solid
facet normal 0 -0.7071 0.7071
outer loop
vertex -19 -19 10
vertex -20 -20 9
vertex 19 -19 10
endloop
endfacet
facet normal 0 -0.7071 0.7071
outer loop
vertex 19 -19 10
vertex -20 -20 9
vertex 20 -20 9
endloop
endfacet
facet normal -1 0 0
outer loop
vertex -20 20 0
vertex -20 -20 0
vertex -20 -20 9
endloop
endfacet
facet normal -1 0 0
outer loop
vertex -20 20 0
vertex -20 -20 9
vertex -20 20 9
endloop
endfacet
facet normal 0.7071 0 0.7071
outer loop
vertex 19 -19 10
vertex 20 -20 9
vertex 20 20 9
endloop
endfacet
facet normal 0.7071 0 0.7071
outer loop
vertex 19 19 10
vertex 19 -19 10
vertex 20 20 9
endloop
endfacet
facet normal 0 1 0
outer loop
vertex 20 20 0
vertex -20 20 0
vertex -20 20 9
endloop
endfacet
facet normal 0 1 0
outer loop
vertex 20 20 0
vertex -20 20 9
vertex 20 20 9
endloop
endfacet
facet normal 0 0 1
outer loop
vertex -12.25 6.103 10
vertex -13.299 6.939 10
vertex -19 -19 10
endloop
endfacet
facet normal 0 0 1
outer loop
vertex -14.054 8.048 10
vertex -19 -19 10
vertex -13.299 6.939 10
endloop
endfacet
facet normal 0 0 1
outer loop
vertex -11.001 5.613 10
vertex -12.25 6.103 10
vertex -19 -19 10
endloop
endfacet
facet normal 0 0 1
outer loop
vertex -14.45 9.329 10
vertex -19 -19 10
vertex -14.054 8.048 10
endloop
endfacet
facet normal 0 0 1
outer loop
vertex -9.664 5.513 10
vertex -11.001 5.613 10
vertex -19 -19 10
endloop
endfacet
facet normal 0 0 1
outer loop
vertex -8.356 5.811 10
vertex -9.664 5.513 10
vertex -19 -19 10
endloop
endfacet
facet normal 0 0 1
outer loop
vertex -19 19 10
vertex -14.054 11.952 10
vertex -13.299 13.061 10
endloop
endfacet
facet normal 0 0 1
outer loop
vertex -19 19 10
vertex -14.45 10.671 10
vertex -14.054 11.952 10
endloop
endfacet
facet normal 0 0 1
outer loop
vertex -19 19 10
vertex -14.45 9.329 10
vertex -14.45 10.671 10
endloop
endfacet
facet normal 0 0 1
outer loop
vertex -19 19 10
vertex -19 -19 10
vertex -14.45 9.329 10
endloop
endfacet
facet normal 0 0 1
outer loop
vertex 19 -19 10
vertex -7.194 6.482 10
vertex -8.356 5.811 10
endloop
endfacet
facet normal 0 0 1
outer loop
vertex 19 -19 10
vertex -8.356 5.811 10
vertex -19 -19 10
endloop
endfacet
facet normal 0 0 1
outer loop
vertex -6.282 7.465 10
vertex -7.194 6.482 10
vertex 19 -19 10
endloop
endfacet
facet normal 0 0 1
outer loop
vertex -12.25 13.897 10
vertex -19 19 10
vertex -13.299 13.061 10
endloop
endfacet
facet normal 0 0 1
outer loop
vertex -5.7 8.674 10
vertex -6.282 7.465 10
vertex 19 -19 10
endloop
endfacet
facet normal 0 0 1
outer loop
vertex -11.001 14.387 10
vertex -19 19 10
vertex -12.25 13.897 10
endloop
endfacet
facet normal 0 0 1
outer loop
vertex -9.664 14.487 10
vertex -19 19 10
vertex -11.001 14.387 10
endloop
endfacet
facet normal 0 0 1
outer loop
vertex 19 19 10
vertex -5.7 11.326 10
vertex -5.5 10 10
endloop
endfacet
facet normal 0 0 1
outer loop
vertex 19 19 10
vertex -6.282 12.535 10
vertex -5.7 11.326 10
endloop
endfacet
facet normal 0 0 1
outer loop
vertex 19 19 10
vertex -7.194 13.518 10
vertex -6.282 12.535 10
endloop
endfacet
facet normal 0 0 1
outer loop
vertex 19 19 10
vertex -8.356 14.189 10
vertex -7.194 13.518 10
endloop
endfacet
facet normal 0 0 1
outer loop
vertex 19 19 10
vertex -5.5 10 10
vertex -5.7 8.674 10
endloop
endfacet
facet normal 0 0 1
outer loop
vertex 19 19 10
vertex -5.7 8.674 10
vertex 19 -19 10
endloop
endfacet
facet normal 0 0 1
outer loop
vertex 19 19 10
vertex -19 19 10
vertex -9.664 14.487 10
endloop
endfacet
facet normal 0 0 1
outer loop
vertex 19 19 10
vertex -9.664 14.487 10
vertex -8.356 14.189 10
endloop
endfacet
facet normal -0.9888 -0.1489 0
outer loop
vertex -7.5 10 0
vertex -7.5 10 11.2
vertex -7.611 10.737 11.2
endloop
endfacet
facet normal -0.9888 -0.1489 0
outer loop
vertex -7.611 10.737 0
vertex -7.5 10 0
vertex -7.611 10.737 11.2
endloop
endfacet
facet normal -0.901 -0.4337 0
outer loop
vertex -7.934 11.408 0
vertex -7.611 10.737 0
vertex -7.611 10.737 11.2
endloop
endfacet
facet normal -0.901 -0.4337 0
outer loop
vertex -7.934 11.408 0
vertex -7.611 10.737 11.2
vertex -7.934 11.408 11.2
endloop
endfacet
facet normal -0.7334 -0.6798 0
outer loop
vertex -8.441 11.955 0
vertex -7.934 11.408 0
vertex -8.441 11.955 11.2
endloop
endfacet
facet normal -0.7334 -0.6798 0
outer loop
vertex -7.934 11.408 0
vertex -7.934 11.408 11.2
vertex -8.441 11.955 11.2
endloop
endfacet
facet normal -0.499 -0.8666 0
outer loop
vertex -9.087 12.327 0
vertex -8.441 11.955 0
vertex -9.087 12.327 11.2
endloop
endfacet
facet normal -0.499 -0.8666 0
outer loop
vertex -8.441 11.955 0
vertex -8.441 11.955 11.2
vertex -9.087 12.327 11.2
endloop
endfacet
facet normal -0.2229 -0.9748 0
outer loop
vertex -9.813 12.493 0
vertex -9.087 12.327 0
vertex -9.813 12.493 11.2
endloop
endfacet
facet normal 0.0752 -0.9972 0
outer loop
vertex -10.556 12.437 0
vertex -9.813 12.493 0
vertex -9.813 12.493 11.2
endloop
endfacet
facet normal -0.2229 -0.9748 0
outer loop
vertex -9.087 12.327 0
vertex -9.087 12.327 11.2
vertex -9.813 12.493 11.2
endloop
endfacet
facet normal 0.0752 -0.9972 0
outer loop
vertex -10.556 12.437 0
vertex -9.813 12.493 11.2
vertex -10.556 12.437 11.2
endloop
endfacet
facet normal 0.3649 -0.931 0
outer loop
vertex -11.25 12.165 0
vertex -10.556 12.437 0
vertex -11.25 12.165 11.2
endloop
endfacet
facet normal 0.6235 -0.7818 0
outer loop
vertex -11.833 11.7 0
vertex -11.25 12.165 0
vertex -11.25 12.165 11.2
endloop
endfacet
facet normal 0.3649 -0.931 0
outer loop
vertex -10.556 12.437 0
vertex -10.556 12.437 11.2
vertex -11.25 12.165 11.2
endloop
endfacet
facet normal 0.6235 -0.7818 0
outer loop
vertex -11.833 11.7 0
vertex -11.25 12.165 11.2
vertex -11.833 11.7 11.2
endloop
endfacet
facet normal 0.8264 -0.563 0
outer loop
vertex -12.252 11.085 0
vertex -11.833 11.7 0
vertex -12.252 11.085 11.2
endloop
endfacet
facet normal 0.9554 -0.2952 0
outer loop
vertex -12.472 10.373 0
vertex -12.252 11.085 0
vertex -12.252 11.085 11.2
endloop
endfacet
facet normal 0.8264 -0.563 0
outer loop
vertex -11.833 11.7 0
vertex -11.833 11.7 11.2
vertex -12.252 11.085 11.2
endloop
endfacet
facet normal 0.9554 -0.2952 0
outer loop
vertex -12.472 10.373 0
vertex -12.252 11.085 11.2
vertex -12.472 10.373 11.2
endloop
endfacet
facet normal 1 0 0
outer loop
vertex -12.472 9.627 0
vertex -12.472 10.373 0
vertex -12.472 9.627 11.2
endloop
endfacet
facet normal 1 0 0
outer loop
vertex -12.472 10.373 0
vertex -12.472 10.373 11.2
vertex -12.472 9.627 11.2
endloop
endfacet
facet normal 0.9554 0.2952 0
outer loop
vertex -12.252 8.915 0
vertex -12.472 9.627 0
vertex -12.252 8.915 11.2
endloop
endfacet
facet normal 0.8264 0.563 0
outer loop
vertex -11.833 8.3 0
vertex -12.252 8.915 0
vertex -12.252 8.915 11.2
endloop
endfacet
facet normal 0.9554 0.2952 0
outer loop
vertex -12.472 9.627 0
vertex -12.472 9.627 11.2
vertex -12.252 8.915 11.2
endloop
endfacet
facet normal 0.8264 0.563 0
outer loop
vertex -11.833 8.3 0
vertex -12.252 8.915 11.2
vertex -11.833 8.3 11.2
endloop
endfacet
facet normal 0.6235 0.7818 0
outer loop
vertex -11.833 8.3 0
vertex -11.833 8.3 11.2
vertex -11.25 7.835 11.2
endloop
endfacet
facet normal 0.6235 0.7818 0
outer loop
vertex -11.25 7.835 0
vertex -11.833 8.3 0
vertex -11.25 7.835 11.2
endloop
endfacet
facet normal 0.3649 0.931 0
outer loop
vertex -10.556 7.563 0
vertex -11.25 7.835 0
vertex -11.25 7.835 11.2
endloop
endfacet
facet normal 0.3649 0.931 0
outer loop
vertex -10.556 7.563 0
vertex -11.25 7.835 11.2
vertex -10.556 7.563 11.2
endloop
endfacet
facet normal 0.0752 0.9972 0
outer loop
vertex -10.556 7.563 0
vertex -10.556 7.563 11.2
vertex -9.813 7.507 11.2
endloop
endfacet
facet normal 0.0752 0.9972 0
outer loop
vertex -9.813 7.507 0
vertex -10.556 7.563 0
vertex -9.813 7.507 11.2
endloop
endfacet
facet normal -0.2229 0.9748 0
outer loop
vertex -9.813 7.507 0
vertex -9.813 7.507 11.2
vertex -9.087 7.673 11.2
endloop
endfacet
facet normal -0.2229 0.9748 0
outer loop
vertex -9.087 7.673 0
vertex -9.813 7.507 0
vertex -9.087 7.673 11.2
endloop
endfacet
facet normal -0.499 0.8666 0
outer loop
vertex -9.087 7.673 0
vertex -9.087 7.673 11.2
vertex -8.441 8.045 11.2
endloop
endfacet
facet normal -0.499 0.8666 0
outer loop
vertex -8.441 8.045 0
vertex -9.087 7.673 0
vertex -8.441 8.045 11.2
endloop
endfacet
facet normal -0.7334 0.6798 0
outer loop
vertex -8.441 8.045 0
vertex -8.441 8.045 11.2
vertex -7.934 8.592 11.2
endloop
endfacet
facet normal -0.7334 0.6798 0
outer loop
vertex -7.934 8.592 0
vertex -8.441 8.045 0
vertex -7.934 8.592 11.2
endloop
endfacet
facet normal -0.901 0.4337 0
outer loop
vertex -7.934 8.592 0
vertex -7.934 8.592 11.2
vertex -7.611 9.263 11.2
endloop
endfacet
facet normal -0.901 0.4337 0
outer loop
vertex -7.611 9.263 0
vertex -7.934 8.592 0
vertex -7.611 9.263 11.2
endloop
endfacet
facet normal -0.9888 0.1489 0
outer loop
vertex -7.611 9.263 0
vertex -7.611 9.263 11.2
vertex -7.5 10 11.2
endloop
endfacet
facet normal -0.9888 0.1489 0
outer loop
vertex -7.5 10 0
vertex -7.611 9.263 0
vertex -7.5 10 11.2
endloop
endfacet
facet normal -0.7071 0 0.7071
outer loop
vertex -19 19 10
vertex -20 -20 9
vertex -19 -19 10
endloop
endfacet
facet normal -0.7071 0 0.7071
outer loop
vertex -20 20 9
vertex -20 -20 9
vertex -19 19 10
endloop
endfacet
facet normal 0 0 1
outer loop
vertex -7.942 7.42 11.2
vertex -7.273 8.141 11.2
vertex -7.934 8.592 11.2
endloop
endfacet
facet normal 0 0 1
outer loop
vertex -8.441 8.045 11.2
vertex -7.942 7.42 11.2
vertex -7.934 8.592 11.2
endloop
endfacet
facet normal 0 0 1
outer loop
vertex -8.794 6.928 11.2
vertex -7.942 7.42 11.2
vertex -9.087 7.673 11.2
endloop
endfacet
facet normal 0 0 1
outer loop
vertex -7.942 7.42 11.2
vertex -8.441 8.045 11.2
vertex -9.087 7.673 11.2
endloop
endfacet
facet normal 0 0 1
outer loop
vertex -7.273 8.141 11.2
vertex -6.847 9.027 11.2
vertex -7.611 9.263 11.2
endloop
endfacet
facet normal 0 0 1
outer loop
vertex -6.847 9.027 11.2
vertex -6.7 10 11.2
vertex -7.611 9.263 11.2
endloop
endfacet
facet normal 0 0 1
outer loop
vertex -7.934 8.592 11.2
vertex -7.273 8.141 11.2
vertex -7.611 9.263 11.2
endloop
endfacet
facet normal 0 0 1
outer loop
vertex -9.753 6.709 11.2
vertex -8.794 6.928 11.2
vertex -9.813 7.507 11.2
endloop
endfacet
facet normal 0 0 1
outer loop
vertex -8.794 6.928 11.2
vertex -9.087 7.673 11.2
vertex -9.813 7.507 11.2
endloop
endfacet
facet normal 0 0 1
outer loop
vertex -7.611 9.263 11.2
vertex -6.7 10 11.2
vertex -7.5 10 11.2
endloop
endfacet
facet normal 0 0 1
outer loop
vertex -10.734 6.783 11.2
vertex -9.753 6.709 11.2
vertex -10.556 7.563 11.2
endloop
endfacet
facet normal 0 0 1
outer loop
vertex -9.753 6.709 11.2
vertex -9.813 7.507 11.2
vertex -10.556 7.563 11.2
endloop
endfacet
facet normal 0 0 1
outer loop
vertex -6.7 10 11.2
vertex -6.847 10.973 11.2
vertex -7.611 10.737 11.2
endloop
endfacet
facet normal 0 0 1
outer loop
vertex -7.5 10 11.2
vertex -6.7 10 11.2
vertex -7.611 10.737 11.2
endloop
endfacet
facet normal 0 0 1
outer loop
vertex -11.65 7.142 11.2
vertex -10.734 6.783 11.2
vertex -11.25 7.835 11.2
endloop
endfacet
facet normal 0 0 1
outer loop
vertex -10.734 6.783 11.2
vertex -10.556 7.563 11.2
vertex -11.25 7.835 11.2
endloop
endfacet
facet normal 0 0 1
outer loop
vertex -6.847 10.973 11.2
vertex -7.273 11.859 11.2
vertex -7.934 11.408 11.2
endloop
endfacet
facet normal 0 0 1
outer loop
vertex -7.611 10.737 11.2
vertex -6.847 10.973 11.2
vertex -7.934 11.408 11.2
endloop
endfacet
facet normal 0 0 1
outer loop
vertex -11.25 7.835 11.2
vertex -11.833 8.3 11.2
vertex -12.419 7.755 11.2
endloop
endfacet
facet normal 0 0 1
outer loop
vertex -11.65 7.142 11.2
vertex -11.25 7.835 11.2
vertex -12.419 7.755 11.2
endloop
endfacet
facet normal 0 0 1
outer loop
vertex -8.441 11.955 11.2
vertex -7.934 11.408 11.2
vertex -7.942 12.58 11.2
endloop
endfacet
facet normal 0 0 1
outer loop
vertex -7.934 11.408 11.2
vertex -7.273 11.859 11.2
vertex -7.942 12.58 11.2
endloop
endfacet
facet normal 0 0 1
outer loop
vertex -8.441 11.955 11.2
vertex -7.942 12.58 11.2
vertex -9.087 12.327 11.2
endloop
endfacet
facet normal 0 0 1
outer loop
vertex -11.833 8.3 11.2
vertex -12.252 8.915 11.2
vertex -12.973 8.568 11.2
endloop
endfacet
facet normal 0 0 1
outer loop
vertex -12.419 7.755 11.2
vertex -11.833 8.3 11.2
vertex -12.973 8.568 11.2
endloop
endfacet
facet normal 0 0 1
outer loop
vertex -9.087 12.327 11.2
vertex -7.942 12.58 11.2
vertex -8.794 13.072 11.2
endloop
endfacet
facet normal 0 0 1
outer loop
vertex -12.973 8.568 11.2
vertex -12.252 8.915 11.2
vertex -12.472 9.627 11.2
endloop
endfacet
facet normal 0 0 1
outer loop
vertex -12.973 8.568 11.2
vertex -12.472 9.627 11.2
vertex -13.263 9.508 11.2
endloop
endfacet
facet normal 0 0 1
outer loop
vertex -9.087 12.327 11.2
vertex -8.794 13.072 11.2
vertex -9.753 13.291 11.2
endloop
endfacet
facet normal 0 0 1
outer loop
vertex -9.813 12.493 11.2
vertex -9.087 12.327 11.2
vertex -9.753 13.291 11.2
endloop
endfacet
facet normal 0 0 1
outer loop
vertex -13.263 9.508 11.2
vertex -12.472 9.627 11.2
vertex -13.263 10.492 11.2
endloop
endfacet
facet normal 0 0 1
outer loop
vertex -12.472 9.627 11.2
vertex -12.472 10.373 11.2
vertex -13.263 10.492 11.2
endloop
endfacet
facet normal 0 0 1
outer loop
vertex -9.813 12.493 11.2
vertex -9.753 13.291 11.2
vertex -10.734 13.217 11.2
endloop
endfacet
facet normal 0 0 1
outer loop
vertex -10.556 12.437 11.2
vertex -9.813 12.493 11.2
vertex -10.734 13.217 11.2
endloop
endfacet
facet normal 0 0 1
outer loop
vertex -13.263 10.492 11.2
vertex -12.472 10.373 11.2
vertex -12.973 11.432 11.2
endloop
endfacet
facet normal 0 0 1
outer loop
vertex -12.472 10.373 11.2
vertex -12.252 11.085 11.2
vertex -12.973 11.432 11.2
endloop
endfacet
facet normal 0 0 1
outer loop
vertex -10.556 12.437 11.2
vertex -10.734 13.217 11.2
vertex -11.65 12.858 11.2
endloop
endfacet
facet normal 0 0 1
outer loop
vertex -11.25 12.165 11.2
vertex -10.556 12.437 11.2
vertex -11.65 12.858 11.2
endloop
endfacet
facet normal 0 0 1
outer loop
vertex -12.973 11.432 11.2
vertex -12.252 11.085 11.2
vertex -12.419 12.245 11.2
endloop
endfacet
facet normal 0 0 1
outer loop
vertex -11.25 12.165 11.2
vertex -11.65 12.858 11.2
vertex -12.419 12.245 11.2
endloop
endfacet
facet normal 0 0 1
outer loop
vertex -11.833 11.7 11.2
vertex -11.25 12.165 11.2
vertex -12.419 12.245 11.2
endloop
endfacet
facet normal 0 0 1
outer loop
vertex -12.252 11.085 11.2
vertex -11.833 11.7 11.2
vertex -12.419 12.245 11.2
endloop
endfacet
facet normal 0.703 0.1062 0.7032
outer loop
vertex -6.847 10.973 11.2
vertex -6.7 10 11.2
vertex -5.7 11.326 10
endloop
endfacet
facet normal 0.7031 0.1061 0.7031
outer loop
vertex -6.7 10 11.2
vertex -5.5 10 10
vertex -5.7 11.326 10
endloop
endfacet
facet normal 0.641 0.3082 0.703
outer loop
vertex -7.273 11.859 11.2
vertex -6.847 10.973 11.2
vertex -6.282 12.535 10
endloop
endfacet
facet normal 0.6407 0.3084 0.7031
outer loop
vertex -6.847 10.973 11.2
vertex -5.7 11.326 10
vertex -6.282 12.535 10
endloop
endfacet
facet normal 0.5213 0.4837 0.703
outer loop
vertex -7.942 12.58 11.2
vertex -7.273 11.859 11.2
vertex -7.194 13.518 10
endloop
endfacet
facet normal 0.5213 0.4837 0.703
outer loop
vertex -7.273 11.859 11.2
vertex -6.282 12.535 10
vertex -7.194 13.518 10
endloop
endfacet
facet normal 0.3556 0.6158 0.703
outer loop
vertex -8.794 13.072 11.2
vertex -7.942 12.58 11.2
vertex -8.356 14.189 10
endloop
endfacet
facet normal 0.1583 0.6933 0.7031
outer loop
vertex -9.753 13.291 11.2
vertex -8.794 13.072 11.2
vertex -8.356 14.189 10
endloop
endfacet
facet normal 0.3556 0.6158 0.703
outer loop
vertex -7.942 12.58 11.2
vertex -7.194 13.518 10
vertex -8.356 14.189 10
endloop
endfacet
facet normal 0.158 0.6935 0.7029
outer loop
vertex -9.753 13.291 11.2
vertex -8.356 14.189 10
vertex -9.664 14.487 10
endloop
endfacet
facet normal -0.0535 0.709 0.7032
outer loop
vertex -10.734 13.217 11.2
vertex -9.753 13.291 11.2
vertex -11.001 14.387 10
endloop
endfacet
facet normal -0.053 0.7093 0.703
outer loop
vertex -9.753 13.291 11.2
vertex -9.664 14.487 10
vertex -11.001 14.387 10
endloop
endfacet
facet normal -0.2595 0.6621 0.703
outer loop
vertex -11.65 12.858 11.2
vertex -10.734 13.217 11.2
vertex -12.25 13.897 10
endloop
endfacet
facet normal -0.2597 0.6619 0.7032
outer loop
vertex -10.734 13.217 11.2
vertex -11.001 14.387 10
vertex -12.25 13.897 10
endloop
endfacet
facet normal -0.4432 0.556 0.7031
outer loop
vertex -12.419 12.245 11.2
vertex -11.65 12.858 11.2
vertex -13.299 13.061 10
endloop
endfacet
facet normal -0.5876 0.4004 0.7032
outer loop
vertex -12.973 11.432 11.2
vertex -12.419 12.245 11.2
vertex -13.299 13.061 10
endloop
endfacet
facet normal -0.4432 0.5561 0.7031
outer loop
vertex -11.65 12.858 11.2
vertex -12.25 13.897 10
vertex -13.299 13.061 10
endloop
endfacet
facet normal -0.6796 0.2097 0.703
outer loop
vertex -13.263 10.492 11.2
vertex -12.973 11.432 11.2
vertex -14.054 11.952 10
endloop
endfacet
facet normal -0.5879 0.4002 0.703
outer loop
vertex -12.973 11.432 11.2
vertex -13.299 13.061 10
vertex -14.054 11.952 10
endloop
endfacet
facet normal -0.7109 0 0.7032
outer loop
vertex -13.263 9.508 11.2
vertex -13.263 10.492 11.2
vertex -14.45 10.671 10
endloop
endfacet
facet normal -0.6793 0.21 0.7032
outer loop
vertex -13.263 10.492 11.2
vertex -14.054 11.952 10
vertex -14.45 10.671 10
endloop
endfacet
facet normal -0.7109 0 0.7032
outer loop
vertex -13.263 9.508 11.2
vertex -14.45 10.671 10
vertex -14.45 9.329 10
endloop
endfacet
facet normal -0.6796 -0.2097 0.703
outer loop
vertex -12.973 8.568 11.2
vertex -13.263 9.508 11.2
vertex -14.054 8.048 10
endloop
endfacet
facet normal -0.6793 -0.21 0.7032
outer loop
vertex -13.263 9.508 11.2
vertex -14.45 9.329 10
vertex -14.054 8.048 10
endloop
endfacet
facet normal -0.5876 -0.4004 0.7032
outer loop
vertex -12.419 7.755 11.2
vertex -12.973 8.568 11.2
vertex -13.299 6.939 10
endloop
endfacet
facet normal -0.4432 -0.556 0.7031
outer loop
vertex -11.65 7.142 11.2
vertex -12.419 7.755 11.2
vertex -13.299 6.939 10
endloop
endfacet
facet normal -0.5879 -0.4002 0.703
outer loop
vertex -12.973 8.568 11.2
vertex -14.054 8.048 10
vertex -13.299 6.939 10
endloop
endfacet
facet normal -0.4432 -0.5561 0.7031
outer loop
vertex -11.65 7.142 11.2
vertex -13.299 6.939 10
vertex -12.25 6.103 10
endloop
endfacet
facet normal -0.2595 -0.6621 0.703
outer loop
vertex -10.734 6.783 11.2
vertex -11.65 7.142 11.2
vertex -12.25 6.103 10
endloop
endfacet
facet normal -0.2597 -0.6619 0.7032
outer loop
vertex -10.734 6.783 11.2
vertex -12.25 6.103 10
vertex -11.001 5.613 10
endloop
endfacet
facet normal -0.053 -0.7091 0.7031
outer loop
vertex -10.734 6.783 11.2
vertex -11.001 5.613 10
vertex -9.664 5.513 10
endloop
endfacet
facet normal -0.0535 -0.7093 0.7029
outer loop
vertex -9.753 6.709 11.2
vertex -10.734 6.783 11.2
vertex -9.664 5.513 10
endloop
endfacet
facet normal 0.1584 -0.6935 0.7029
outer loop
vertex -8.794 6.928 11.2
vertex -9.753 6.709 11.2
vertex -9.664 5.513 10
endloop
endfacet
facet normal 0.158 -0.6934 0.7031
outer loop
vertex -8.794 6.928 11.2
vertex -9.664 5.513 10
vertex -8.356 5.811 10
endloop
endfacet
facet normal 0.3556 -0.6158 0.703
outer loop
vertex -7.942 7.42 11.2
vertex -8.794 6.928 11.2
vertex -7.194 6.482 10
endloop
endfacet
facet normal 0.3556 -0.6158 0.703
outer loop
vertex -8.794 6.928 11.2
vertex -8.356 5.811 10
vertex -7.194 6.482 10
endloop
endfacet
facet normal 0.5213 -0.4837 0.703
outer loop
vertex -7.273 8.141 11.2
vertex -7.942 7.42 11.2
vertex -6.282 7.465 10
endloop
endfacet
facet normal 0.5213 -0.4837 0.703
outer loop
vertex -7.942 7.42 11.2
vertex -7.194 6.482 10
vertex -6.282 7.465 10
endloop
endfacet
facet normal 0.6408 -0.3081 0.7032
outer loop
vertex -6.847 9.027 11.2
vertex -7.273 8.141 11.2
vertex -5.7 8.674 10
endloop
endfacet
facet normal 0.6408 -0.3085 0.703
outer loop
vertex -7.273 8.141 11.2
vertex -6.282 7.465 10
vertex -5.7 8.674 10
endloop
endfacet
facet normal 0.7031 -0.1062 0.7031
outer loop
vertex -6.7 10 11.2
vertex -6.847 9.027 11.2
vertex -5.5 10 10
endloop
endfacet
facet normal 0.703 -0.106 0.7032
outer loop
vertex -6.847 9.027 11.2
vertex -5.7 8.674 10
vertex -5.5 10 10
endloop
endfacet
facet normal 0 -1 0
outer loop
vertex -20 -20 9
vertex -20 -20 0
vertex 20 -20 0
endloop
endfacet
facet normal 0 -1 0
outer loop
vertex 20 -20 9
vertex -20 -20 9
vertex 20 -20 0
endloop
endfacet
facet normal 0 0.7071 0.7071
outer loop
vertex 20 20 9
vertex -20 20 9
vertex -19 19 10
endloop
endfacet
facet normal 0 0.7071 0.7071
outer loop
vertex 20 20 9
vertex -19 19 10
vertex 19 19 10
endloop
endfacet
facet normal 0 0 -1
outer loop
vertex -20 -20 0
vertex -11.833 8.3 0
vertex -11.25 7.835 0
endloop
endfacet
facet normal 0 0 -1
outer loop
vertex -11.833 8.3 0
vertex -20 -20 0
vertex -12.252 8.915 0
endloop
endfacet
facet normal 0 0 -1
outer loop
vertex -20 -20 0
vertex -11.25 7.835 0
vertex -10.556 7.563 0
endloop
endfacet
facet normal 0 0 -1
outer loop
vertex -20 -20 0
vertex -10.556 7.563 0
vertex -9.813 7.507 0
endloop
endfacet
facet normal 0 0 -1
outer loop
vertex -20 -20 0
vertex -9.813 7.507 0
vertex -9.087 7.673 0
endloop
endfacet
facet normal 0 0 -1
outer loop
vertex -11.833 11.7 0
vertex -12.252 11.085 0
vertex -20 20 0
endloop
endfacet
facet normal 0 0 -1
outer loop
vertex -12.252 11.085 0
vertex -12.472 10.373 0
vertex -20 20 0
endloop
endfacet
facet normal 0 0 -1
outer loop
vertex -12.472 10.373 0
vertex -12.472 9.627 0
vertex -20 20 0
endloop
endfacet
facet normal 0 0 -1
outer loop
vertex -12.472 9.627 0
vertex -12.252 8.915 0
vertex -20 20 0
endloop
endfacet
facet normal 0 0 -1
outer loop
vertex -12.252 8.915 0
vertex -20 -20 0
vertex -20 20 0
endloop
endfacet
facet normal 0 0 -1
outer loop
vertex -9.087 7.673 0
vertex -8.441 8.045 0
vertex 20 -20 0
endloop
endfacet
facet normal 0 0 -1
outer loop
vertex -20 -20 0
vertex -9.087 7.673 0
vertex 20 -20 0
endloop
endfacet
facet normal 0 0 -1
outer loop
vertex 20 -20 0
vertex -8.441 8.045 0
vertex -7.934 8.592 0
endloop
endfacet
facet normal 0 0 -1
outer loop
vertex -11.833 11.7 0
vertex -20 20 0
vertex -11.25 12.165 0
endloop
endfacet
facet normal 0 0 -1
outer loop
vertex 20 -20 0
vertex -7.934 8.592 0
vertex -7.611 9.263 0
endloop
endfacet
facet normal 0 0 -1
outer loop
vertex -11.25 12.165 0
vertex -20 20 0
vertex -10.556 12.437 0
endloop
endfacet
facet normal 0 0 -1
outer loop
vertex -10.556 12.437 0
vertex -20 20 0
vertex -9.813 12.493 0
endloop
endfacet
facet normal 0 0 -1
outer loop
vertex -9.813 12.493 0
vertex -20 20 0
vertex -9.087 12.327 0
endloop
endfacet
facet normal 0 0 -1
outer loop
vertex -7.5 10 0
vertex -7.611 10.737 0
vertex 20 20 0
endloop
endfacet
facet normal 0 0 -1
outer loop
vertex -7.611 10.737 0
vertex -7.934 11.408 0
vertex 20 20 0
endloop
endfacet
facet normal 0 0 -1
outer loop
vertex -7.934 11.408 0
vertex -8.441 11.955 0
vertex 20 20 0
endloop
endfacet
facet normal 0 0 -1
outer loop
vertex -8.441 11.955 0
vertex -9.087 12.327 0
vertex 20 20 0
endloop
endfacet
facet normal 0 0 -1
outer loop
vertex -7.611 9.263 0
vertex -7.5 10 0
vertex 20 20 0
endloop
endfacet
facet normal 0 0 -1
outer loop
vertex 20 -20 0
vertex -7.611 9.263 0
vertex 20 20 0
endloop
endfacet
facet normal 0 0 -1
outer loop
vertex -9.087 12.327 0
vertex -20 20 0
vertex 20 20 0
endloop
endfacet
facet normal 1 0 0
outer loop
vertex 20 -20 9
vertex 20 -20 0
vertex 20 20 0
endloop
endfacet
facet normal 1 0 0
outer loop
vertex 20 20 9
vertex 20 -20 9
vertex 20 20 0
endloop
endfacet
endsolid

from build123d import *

# Parameters (mm, degrees)
SKETCH_W     = 40
SKETCH_H     = 40
SKETCH_R     = 2.5
PAD_DEPTH    = 10
CHAMFER_SIZE = 1


with BuildPart() as part:
    # Sketch → Pad (new body)
    with BuildSketch(Plane.XY):
        Rectangle(SKETCH_W, SKETCH_H)
        with Locations((-10, 10)):
            Circle(SKETCH_R, mode=Mode.SUBTRACT)
    extrude(amount=PAD_DEPTH)

    # Sketch001 → Revolution (revolve)
    with BuildSketch(Plane(origin=(-10, 10, 0), x_dir=(1, 0, 0), z_dir=(0, -1, 0))):
        Polygon((2.5, 11.2), (3.3, 11.2), (4.5, 10), (2.5, 10), align=None)
    revolve(axis=Axis((-10, 10, 0), (0, 0, 1)))

    # Chamfer
    chamfer_edges = [part.edges().sort_by_distance(p)[0] for p in [
        (0, -20, 10),
        (-20, 0, 10),
        (0, 20, 10),
        (20, 0, 10),
    ]]
    chamfer(chamfer_edges, length=CHAMFER_SIZE)


solid = part.part
